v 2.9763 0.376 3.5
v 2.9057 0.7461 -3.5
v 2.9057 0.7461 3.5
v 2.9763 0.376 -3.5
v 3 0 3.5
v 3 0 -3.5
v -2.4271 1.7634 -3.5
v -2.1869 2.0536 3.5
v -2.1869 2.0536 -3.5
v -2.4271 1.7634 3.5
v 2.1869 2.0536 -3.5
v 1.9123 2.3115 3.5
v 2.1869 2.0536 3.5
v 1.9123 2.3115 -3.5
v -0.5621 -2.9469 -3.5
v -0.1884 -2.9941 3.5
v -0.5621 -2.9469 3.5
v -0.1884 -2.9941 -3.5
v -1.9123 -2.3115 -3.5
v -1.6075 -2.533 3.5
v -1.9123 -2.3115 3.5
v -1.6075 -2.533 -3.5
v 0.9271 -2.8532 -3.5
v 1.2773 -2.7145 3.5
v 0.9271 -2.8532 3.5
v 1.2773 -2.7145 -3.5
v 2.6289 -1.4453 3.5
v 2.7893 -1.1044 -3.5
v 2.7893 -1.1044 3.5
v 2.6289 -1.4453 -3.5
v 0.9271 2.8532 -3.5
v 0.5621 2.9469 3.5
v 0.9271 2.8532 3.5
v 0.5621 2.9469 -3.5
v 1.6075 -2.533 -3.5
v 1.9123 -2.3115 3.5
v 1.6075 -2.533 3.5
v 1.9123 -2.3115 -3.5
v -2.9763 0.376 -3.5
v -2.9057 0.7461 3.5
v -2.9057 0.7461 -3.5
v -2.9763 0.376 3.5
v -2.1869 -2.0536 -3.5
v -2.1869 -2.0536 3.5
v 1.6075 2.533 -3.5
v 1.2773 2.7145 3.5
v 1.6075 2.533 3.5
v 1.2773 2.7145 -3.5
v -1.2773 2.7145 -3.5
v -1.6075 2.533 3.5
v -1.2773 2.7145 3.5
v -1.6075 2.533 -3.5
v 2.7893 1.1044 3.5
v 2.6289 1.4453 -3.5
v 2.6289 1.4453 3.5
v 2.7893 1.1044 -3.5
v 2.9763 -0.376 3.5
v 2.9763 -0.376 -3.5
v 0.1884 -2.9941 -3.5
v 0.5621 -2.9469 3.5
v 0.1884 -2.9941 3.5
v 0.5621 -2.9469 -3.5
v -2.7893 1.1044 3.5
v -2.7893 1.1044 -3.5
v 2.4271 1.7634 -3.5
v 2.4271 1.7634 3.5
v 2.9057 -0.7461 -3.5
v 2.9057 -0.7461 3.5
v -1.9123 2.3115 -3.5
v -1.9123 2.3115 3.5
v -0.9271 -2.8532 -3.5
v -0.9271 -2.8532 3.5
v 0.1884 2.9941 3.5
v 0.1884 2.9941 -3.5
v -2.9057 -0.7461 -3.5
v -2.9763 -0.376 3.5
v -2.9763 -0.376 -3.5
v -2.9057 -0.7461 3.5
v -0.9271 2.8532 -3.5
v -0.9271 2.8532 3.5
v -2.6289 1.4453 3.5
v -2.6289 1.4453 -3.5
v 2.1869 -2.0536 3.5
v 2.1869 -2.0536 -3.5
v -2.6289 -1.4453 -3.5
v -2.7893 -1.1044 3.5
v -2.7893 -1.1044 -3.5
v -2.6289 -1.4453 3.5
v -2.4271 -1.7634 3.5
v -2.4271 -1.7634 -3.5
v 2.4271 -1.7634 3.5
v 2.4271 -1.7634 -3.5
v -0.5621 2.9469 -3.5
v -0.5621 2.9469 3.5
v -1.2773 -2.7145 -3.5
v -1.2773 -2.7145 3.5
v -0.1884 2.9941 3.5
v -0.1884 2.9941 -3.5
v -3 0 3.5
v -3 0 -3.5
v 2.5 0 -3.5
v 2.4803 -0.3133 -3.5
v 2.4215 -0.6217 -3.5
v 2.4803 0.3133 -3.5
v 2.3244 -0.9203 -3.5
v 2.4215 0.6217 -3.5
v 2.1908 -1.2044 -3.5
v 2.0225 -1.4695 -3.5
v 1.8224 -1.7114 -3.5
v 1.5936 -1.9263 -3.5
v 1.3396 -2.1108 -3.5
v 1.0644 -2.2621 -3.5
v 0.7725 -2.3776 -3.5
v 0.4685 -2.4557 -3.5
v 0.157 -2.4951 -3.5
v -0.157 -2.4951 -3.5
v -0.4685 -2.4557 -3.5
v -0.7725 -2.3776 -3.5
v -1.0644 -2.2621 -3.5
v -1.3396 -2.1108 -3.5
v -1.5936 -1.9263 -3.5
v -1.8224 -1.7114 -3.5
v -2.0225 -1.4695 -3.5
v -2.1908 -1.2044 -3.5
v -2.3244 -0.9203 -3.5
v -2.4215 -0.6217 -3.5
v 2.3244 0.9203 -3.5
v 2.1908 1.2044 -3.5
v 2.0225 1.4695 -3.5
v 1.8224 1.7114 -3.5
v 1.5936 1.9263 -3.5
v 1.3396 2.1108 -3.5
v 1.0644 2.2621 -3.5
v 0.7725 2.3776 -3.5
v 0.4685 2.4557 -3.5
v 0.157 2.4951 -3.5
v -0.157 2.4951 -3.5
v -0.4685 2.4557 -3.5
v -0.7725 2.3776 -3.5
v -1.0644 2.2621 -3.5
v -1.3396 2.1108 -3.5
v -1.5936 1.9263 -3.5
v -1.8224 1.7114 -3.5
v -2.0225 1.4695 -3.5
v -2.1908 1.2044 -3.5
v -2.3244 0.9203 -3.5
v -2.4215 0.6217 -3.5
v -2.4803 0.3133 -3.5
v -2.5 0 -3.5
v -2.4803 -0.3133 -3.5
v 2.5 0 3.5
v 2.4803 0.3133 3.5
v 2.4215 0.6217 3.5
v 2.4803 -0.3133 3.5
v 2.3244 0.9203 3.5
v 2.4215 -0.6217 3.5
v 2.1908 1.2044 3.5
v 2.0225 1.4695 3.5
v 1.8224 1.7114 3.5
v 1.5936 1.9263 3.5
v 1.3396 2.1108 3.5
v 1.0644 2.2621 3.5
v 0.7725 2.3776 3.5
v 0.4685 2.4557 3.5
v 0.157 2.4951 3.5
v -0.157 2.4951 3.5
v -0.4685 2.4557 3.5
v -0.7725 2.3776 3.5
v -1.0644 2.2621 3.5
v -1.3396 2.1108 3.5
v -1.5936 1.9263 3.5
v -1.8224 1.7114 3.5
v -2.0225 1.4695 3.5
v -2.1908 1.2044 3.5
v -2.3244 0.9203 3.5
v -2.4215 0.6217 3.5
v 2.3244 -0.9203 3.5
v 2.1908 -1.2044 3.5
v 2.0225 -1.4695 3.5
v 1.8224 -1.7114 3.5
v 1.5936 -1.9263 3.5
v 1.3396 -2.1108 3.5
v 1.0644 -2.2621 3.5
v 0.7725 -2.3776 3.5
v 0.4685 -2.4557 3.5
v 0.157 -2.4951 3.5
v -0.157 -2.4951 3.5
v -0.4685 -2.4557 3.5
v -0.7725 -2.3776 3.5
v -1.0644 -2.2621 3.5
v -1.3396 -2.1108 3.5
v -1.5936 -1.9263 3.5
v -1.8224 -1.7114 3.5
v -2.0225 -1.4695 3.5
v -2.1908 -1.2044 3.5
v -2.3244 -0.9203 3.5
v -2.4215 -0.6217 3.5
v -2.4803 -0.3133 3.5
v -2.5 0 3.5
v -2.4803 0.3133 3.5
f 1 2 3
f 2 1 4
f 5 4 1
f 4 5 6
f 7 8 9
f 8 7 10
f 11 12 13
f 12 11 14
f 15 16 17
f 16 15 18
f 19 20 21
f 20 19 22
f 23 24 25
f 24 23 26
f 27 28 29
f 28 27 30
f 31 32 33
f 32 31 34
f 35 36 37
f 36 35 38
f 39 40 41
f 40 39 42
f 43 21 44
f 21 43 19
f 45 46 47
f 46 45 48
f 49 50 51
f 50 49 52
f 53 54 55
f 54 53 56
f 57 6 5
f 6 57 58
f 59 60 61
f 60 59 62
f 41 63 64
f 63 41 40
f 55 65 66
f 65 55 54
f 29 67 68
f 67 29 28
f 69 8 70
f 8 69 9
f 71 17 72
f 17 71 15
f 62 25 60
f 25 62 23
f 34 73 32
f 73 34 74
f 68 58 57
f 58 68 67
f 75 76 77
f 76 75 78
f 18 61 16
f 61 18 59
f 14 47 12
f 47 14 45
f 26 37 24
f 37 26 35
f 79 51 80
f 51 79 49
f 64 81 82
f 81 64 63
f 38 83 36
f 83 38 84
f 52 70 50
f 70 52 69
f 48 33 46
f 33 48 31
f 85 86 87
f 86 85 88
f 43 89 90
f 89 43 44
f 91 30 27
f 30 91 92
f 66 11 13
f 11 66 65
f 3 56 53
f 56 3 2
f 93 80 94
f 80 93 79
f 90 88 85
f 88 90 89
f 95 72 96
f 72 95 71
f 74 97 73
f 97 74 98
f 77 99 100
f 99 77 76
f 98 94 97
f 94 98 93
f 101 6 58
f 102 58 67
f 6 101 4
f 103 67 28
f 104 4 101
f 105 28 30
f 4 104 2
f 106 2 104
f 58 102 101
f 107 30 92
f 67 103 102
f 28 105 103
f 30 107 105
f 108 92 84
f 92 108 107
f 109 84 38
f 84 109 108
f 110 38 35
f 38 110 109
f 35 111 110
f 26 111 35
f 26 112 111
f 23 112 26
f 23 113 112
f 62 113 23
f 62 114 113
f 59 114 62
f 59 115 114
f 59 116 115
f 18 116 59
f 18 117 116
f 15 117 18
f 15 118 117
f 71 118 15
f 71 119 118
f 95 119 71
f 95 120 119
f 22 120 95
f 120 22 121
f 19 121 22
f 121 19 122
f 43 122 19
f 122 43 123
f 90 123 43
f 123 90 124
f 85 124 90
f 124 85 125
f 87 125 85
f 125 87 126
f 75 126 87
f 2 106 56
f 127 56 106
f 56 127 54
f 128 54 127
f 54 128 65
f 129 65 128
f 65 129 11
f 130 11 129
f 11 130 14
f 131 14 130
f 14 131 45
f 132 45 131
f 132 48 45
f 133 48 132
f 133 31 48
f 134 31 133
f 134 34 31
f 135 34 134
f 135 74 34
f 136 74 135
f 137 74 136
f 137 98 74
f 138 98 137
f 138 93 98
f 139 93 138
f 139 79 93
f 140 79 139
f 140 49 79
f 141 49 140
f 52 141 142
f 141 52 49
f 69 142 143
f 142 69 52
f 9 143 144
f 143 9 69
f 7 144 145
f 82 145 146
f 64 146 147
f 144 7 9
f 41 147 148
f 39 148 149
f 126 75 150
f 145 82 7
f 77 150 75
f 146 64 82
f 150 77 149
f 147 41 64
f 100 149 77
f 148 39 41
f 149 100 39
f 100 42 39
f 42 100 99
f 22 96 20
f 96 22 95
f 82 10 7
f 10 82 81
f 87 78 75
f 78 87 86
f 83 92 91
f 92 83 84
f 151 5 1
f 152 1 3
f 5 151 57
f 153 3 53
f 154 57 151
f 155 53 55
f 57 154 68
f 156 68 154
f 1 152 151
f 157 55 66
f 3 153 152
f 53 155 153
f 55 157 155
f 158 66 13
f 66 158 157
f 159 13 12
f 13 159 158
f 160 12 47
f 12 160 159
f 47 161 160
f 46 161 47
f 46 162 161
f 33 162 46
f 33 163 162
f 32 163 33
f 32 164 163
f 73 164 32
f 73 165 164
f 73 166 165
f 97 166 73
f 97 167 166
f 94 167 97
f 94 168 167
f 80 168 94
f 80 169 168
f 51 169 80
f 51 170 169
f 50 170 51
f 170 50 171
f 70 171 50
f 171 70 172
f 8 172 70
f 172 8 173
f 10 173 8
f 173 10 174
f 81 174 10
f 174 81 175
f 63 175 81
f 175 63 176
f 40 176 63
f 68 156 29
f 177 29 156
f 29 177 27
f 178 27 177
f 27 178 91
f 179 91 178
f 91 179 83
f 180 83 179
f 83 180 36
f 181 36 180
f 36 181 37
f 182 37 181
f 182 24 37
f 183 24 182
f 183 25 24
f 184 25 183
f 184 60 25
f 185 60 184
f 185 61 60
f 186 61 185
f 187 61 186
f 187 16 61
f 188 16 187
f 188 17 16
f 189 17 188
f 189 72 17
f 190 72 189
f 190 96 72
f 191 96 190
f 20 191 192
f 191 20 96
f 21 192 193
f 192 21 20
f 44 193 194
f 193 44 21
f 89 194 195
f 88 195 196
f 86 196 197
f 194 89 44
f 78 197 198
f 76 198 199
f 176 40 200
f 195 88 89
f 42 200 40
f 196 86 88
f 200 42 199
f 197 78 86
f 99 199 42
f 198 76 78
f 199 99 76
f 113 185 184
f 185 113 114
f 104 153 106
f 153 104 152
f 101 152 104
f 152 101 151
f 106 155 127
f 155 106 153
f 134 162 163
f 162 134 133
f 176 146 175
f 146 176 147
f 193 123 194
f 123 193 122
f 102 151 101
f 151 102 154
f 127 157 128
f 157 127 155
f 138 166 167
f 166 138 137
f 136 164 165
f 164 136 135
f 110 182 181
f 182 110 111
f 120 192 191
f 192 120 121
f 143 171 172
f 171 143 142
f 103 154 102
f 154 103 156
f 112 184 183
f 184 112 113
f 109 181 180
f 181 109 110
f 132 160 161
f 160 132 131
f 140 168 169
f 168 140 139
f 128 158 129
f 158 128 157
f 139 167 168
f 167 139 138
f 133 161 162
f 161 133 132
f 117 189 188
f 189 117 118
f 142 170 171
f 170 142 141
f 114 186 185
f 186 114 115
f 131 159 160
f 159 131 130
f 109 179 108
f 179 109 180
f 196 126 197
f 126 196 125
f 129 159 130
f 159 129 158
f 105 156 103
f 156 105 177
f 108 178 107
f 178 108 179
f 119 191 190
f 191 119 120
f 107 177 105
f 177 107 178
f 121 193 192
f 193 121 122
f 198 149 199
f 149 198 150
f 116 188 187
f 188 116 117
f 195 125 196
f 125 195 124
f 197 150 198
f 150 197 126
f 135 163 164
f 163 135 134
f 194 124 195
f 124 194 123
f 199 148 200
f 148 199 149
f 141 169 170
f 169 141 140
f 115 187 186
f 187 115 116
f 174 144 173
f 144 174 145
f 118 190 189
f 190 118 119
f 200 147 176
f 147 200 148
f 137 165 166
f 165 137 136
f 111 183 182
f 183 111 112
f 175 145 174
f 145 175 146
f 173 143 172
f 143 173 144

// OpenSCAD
$fn = 50;


difference() {
	union() {
		translate(v = [0, 0, -3.5000000000]) {
			cylinder(h = 7, r = 3.0000000000);
		}
	}
	union() {
		translate(v = [0, 0, -100.0000000000]) {
			cylinder(h = 200, r = 2.5000000000);
		}
	}
}
